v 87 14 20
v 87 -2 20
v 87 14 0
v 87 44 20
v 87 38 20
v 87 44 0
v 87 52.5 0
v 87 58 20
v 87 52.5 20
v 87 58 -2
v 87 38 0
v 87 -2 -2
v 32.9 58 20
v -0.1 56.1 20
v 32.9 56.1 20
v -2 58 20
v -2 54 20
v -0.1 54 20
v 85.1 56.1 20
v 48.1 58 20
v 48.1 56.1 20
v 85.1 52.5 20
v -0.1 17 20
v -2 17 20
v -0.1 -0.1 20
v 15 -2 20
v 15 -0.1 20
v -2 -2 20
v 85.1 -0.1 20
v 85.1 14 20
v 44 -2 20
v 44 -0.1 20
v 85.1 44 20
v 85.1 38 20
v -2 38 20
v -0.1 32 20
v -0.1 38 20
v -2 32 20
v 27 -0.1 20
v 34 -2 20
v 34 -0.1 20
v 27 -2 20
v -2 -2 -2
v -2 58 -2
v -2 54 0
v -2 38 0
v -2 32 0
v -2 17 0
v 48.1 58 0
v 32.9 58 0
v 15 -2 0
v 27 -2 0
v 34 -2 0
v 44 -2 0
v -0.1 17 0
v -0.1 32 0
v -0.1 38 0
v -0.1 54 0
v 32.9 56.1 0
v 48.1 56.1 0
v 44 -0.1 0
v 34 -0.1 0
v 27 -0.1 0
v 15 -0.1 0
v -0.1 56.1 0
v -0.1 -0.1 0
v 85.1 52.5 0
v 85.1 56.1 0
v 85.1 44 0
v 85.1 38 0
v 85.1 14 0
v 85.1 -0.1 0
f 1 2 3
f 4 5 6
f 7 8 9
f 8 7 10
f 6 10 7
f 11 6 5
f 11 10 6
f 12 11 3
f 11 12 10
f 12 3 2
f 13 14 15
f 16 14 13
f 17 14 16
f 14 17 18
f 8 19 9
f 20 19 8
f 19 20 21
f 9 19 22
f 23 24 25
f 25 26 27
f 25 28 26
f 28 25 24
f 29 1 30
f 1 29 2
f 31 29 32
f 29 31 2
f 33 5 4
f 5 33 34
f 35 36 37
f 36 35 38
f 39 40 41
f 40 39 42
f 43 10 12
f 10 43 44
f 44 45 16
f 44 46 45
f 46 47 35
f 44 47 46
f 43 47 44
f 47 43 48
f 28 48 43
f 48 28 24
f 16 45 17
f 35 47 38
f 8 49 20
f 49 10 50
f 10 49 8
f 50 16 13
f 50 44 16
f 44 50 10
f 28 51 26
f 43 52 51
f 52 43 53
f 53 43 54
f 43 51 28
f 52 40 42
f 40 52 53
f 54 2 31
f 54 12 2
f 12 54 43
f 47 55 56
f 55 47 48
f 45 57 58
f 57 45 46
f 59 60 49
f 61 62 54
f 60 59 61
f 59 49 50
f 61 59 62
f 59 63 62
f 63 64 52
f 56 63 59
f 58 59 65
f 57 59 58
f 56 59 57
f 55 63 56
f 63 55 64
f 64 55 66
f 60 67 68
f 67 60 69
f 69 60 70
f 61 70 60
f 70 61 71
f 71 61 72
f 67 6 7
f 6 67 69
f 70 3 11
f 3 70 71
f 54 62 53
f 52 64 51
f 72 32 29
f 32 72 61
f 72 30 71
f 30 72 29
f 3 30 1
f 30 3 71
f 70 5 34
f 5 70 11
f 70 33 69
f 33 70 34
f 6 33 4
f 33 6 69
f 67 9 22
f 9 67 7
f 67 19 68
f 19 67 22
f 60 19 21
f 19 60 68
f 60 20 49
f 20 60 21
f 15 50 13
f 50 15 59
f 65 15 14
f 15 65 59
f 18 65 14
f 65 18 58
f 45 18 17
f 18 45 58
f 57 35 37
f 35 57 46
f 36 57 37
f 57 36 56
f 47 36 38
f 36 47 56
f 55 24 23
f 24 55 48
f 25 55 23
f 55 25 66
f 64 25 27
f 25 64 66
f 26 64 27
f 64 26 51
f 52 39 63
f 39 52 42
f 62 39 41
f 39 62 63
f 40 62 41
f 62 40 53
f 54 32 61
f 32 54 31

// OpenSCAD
wall_thickness = 2;

pi_width = 56;
pi_length = 85;

sd_card_width = 24;
sd_card_length = 35;
sd_card_y_offset = 14;
sd_card_x_offset = 68;

usb_y_offset = 17;
usb_x_offset = -wall_thickness;
usb_width = 15;
usb_length = 17;

combo_length = 10;
combo_x_offset = 34;
combo_y_offset = - 7;
combo_width = 19;

sound_length = 12;
sound_x_offset = 15;
sound_width = 15;
sound_y_offset = - 4;

ethernet_y_offset = 38;
ethernet_x_offset = -wall_thickness;
ethernet_width = 16;
ethernet_length = 22;

power_x_offset = pi_length - wall_thickness;
power_y_offset = 44;
power_height = 8.5;
power_length = 5;

hdmi_x_offset = 32.9;
hdmi_y_offset = pi_width - wall_thickness;
hdmi_height = 5;
hdmi_length = 15.2;

difference() {
translate([-wall_thickness, -wall_thickness, -wall_thickness])
cube([pi_length + 2 * wall_thickness, pi_width + 2 * wall_thickness, 20 + wall_thickness]);

linear_extrude(20)
union() {
    translate([-0.1, -0.1])
    square([pi_length+0.2, pi_width+0.2]);
    
    translate([ethernet_x_offset, ethernet_y_offset])
    square([ethernet_length, ethernet_width]);
    
    translate([usb_x_offset, usb_y_offset])
    square([usb_length, usb_width]);
    
    translate([sd_card_x_offset, sd_card_y_offset])
    square([sd_card_length, sd_card_width]);
    
    translate([combo_x_offset, combo_y_offset])
    square([combo_length, combo_width]);
    
    translate([sound_x_offset, sound_y_offset])
    square([sound_length, sound_width]);
    
    translate([power_x_offset, power_y_offset])
    square([power_length, power_height]);
    
    translate([hdmi_x_offset, hdmi_y_offset])
    square([hdmi_length, hdmi_height]);
};
};
